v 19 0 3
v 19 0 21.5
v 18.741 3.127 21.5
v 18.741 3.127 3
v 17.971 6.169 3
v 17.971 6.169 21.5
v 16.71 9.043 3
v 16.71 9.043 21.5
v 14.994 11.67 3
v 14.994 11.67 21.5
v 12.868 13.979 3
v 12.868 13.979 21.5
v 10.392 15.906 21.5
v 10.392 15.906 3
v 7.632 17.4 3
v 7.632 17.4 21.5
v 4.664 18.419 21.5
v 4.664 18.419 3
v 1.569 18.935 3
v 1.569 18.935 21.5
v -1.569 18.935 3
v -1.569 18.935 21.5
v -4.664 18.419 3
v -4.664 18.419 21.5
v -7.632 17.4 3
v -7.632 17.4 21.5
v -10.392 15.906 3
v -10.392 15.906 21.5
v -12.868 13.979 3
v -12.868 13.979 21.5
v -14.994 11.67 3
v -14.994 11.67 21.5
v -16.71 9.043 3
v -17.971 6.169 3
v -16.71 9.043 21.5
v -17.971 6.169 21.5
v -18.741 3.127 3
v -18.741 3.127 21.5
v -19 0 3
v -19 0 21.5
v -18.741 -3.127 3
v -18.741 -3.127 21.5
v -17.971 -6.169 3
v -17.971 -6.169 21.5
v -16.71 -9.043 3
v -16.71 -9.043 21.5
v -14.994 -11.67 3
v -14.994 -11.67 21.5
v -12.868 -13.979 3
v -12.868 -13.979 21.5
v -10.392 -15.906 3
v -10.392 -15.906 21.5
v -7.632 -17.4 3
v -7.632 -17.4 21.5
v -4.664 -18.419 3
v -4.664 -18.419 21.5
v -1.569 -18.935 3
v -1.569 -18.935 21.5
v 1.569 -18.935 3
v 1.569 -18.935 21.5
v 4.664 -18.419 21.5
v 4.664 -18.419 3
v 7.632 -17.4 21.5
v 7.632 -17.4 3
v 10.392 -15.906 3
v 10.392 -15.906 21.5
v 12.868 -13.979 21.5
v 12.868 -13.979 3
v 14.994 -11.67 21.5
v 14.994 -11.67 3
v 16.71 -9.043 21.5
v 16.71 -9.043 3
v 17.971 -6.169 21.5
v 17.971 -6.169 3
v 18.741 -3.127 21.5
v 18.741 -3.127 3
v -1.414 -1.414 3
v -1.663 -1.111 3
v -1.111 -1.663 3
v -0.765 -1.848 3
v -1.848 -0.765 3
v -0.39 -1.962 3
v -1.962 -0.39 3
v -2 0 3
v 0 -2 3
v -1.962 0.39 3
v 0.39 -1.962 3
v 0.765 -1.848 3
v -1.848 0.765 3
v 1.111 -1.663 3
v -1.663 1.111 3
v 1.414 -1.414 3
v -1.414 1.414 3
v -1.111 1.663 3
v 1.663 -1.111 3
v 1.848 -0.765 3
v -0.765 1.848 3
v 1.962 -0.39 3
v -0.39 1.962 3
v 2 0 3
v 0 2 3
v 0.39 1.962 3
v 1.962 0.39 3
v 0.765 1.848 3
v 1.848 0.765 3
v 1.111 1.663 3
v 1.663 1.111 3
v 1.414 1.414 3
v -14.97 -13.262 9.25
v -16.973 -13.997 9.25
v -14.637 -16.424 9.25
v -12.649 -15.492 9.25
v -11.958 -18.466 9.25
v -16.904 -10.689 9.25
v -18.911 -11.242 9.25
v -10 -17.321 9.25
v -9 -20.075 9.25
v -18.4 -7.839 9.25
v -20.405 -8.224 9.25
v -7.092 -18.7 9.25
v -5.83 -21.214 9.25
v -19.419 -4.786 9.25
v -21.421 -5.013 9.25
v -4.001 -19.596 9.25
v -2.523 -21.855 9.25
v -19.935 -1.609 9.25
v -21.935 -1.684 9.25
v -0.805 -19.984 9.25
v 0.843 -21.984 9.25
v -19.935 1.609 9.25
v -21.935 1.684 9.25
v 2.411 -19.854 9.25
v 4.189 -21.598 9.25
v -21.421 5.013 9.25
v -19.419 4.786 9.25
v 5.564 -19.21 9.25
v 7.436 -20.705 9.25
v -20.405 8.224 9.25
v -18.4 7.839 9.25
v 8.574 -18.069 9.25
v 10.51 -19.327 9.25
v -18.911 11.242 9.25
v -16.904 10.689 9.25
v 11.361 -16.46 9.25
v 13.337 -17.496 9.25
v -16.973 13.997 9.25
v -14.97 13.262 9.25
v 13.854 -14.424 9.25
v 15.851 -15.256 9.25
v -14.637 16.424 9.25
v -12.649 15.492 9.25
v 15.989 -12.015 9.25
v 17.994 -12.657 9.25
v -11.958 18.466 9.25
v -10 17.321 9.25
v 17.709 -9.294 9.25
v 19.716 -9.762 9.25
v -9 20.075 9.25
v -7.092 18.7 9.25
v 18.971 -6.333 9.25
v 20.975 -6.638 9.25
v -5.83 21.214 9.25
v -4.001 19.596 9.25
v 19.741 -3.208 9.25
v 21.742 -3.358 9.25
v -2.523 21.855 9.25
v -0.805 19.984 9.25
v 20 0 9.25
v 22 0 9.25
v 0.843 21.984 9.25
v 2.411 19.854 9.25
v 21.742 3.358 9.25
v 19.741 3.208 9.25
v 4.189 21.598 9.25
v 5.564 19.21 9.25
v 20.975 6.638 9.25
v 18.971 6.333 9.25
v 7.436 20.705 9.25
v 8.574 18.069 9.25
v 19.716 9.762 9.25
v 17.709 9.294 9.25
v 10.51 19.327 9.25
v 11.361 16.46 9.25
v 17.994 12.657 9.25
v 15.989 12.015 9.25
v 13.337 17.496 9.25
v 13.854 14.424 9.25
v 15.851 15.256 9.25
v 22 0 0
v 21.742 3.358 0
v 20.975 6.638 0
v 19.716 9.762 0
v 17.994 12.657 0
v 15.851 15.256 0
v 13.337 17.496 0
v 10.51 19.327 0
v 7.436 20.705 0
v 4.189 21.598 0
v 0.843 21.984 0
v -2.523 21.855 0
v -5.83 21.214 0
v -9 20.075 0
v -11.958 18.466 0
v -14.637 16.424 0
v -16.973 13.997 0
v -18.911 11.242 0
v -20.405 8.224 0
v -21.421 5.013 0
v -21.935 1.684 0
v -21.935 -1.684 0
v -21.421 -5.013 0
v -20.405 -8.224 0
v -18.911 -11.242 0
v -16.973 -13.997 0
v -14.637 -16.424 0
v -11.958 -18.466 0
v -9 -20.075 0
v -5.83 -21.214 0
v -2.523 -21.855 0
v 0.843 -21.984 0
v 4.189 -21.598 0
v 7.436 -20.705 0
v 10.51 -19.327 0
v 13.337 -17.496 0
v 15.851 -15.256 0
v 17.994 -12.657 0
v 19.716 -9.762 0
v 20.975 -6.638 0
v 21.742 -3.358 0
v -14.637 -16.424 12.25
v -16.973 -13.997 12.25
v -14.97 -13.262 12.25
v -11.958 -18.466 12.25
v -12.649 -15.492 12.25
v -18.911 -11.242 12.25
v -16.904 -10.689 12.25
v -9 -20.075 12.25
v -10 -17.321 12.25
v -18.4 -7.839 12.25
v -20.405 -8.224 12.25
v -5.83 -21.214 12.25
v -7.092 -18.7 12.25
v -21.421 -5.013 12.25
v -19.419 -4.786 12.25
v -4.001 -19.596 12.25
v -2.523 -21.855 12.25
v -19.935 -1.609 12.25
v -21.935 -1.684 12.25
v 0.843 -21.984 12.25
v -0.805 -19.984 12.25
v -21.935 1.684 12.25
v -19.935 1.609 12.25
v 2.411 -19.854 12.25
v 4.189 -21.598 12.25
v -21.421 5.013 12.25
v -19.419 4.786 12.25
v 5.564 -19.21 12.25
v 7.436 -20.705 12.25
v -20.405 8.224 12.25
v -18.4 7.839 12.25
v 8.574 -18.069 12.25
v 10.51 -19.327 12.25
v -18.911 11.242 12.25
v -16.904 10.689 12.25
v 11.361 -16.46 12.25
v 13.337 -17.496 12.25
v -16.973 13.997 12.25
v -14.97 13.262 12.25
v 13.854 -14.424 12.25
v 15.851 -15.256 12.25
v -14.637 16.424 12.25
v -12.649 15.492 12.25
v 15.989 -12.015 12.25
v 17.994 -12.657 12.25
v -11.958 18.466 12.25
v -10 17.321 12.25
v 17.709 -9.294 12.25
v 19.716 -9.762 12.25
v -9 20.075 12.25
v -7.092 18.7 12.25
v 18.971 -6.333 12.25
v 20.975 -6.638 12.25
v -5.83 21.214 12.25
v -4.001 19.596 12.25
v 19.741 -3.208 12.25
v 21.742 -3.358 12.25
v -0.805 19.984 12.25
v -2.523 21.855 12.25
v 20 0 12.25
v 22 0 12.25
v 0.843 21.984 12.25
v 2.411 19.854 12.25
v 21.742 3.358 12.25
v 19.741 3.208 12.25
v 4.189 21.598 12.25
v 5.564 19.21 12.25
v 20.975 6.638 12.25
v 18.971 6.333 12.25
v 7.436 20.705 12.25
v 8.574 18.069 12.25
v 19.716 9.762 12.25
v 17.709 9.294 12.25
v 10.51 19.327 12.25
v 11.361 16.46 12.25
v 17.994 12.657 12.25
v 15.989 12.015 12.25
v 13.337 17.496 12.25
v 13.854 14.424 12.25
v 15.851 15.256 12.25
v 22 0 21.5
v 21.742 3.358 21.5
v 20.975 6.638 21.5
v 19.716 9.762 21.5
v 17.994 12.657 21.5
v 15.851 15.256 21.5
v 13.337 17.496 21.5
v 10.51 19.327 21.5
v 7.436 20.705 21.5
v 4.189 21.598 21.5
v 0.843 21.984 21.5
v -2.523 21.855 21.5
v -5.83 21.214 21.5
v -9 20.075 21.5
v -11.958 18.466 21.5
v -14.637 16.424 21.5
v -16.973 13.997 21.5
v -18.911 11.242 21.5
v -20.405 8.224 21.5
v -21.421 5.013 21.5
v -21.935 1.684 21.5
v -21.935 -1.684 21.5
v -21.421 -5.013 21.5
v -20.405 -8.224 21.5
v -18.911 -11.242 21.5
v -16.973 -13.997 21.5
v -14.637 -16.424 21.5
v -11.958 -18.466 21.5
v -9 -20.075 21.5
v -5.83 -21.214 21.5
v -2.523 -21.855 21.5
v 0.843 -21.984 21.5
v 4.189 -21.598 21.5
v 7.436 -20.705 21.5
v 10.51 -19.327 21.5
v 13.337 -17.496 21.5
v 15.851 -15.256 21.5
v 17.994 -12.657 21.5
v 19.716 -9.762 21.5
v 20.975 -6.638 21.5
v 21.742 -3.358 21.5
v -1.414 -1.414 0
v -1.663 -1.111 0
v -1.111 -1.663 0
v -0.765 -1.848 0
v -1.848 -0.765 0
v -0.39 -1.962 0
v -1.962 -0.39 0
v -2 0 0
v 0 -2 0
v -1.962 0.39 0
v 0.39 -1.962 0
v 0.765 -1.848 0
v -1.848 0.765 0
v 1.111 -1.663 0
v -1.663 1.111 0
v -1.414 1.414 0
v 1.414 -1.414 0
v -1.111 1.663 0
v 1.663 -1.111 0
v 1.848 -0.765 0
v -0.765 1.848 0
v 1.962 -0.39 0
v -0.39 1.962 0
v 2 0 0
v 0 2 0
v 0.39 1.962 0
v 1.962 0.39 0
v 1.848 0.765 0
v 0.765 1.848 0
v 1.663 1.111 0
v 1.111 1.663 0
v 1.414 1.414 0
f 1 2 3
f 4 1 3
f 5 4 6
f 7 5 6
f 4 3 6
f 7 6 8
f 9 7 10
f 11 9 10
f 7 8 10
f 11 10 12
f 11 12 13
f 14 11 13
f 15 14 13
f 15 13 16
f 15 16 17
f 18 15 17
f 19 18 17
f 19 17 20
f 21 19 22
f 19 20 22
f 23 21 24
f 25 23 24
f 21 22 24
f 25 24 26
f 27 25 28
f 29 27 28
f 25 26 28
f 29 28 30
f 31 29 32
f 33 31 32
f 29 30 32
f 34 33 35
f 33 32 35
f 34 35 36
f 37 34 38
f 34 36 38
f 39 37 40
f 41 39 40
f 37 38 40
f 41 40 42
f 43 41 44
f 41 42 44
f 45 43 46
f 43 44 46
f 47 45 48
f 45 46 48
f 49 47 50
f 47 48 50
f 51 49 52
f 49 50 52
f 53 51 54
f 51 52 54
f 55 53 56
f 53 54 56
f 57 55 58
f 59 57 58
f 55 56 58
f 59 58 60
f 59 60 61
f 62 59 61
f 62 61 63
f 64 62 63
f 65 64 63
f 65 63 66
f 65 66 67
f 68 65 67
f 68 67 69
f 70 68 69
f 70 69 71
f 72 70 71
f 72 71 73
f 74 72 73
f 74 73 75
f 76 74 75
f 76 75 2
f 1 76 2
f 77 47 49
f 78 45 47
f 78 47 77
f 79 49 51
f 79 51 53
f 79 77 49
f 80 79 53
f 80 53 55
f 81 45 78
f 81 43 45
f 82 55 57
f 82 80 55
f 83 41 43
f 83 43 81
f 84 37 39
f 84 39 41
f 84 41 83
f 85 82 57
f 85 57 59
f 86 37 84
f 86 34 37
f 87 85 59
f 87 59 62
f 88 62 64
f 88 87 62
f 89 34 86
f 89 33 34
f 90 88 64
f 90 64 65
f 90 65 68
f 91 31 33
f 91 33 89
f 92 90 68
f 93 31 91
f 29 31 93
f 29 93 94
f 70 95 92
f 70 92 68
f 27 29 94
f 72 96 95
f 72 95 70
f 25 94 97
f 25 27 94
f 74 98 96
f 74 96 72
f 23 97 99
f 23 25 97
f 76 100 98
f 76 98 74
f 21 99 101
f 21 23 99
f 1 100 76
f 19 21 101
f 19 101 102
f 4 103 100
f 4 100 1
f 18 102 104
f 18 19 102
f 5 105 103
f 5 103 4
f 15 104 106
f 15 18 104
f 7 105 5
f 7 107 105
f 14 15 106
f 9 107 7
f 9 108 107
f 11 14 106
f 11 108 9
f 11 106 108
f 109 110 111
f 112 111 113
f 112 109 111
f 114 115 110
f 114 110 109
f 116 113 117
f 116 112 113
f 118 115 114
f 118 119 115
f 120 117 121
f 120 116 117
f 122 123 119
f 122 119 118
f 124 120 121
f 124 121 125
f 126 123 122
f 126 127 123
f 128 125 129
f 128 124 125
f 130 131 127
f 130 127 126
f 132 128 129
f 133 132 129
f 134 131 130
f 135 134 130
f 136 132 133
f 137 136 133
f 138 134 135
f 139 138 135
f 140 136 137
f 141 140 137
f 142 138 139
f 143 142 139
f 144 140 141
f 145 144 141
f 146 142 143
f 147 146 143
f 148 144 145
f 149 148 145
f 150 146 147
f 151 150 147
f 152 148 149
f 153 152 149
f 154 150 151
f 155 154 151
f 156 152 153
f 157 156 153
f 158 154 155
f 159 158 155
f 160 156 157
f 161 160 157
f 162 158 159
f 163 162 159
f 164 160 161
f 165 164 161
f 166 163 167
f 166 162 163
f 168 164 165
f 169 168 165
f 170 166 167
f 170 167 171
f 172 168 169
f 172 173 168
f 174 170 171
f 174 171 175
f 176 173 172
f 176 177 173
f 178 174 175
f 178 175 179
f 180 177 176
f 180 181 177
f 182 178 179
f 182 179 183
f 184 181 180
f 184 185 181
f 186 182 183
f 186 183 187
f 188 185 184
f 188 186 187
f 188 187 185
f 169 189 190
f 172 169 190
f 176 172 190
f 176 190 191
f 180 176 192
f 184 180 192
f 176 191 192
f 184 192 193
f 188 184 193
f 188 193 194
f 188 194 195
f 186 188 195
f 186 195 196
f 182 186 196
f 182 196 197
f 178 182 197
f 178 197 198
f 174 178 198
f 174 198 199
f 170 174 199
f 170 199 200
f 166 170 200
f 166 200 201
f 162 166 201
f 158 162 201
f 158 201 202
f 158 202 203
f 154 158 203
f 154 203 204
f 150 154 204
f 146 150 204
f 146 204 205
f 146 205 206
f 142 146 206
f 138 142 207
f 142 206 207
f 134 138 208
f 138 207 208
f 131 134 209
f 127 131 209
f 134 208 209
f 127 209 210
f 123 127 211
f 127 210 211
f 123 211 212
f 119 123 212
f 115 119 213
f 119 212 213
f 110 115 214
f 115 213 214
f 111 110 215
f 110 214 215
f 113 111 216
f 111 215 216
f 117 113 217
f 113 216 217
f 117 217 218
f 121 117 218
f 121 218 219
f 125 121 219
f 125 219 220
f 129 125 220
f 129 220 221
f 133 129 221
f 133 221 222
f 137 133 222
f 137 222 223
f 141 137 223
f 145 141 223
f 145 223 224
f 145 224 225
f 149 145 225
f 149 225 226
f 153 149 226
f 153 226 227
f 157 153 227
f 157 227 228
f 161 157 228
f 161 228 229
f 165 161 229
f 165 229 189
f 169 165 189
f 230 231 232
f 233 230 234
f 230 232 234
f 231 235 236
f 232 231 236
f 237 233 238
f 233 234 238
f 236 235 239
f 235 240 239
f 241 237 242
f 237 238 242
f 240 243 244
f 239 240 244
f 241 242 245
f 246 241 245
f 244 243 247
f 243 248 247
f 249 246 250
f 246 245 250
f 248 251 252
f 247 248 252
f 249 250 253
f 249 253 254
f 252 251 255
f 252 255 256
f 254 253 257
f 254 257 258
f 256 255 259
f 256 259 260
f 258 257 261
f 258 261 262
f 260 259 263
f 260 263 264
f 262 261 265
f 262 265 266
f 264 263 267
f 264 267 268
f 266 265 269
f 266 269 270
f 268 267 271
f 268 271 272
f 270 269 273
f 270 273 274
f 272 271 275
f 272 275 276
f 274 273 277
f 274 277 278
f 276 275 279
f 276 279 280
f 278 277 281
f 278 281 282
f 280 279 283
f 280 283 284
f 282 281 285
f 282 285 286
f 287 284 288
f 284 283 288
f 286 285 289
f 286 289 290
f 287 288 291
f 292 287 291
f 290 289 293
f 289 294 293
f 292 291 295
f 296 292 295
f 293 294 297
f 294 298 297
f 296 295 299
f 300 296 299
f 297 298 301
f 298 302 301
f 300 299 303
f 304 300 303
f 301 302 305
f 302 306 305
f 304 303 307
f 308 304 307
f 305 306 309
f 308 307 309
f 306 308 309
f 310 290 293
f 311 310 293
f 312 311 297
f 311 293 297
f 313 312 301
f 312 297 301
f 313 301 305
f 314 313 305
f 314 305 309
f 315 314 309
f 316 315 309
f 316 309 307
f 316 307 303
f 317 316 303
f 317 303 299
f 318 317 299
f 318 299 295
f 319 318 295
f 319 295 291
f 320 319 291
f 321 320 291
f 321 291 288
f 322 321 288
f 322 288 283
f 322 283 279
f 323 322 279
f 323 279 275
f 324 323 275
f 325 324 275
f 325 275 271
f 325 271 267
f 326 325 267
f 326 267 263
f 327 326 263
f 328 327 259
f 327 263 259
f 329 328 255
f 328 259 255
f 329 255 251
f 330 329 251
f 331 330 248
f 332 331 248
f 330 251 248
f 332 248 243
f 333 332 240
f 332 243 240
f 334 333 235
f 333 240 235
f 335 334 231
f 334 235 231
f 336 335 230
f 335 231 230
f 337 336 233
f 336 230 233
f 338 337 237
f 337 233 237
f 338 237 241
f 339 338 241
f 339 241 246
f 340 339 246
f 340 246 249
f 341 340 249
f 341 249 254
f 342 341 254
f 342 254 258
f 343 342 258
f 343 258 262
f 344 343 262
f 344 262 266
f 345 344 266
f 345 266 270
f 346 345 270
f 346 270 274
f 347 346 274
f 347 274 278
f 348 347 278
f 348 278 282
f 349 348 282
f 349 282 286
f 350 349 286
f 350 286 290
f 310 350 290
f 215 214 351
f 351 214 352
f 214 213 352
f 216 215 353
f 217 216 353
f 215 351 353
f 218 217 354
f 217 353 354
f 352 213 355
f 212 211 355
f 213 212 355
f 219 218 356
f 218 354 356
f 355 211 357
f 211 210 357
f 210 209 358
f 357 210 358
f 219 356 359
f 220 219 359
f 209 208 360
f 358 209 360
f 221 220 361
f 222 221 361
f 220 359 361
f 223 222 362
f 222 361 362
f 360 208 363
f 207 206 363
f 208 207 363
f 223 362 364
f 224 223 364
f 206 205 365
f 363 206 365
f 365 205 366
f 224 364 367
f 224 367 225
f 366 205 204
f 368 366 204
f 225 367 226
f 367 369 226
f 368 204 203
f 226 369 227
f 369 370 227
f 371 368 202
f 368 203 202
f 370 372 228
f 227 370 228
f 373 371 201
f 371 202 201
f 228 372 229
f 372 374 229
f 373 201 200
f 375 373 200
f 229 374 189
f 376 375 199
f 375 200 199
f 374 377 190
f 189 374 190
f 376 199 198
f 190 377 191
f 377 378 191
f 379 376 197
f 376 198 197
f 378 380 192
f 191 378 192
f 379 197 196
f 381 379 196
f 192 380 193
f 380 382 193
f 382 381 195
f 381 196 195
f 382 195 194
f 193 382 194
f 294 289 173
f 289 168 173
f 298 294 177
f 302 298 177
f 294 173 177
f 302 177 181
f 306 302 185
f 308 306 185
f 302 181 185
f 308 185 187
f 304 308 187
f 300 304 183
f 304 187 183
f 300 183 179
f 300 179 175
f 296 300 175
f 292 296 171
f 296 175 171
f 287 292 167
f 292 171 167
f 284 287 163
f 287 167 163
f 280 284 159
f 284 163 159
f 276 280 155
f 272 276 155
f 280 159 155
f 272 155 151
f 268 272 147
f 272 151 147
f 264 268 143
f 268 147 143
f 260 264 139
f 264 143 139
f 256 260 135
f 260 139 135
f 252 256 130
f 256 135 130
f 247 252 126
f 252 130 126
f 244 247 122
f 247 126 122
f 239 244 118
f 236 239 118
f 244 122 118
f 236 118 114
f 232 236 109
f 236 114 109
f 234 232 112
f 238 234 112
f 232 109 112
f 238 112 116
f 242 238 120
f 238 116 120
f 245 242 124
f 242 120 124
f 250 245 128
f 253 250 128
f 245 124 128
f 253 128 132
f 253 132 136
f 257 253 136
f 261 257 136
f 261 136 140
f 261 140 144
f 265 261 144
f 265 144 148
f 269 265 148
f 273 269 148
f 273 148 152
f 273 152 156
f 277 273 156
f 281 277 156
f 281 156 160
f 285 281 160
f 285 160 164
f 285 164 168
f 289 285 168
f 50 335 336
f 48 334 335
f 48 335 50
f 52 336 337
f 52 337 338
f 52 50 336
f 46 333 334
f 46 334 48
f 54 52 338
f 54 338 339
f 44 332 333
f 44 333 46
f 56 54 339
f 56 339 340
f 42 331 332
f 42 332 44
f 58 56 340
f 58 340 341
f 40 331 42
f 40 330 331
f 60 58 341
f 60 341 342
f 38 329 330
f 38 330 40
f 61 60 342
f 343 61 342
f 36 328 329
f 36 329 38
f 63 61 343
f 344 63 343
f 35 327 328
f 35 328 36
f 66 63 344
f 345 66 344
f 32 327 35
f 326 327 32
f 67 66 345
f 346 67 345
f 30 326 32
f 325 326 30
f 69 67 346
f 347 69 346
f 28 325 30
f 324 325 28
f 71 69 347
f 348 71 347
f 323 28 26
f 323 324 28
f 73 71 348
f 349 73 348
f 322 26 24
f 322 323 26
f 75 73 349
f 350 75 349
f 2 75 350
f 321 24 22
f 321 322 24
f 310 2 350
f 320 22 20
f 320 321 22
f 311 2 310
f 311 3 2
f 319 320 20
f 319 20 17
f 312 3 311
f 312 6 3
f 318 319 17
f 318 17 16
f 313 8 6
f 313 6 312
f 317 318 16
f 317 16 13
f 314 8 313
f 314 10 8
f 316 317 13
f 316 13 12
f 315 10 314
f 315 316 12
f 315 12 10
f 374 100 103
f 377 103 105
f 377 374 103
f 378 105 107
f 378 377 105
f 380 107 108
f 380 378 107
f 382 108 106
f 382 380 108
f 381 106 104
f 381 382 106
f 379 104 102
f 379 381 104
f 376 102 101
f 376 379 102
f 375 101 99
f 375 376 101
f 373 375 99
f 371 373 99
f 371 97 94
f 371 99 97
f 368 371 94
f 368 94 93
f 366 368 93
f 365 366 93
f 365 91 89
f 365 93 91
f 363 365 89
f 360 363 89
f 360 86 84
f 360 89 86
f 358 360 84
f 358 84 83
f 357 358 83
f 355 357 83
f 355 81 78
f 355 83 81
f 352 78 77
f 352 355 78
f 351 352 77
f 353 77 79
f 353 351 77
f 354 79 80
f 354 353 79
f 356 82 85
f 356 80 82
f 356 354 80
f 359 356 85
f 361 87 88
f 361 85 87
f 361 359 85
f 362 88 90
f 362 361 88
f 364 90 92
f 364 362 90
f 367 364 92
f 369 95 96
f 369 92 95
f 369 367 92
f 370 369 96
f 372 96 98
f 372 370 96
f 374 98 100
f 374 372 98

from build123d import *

# Parameters (mm, degrees)
SKETCH1_R           = 22
SKETCH1_R_2         = 2
BOSS_EXTRUDE1_DEPTH = 21.5
SKETCH2_R           = 19
CUT_EXTRUDE1_DEPTH  = 18.5
SKETCH3_R           = 22
SKETCH3_R_2         = 20
CUT_EXTRUDE2_DEPTH  = 1.5


with BuildPart() as part:
    # Sketch1 → Boss-Extrude1 (new body)
    with BuildSketch(Plane.XY):
        Circle(SKETCH1_R)
        Circle(SKETCH1_R_2, mode=Mode.SUBTRACT)
    extrude(amount=BOSS_EXTRUDE1_DEPTH)

    # Sketch2 → Cut-Extrude1 (cut)
    with BuildSketch(Plane.XY.offset(21.5)):
        Circle(SKETCH2_R)
    extrude(amount=-CUT_EXTRUDE1_DEPTH, mode=Mode.SUBTRACT)

    # Sketch3 → Cut-Extrude2 (cut, symmetric)
    with BuildSketch(Plane.XY.offset(10.75)):
        Circle(SKETCH3_R)
        Circle(SKETCH3_R_2, mode=Mode.SUBTRACT)
    extrude(amount=CUT_EXTRUDE2_DEPTH, both=True, mode=Mode.SUBTRACT)


solid = part.part
